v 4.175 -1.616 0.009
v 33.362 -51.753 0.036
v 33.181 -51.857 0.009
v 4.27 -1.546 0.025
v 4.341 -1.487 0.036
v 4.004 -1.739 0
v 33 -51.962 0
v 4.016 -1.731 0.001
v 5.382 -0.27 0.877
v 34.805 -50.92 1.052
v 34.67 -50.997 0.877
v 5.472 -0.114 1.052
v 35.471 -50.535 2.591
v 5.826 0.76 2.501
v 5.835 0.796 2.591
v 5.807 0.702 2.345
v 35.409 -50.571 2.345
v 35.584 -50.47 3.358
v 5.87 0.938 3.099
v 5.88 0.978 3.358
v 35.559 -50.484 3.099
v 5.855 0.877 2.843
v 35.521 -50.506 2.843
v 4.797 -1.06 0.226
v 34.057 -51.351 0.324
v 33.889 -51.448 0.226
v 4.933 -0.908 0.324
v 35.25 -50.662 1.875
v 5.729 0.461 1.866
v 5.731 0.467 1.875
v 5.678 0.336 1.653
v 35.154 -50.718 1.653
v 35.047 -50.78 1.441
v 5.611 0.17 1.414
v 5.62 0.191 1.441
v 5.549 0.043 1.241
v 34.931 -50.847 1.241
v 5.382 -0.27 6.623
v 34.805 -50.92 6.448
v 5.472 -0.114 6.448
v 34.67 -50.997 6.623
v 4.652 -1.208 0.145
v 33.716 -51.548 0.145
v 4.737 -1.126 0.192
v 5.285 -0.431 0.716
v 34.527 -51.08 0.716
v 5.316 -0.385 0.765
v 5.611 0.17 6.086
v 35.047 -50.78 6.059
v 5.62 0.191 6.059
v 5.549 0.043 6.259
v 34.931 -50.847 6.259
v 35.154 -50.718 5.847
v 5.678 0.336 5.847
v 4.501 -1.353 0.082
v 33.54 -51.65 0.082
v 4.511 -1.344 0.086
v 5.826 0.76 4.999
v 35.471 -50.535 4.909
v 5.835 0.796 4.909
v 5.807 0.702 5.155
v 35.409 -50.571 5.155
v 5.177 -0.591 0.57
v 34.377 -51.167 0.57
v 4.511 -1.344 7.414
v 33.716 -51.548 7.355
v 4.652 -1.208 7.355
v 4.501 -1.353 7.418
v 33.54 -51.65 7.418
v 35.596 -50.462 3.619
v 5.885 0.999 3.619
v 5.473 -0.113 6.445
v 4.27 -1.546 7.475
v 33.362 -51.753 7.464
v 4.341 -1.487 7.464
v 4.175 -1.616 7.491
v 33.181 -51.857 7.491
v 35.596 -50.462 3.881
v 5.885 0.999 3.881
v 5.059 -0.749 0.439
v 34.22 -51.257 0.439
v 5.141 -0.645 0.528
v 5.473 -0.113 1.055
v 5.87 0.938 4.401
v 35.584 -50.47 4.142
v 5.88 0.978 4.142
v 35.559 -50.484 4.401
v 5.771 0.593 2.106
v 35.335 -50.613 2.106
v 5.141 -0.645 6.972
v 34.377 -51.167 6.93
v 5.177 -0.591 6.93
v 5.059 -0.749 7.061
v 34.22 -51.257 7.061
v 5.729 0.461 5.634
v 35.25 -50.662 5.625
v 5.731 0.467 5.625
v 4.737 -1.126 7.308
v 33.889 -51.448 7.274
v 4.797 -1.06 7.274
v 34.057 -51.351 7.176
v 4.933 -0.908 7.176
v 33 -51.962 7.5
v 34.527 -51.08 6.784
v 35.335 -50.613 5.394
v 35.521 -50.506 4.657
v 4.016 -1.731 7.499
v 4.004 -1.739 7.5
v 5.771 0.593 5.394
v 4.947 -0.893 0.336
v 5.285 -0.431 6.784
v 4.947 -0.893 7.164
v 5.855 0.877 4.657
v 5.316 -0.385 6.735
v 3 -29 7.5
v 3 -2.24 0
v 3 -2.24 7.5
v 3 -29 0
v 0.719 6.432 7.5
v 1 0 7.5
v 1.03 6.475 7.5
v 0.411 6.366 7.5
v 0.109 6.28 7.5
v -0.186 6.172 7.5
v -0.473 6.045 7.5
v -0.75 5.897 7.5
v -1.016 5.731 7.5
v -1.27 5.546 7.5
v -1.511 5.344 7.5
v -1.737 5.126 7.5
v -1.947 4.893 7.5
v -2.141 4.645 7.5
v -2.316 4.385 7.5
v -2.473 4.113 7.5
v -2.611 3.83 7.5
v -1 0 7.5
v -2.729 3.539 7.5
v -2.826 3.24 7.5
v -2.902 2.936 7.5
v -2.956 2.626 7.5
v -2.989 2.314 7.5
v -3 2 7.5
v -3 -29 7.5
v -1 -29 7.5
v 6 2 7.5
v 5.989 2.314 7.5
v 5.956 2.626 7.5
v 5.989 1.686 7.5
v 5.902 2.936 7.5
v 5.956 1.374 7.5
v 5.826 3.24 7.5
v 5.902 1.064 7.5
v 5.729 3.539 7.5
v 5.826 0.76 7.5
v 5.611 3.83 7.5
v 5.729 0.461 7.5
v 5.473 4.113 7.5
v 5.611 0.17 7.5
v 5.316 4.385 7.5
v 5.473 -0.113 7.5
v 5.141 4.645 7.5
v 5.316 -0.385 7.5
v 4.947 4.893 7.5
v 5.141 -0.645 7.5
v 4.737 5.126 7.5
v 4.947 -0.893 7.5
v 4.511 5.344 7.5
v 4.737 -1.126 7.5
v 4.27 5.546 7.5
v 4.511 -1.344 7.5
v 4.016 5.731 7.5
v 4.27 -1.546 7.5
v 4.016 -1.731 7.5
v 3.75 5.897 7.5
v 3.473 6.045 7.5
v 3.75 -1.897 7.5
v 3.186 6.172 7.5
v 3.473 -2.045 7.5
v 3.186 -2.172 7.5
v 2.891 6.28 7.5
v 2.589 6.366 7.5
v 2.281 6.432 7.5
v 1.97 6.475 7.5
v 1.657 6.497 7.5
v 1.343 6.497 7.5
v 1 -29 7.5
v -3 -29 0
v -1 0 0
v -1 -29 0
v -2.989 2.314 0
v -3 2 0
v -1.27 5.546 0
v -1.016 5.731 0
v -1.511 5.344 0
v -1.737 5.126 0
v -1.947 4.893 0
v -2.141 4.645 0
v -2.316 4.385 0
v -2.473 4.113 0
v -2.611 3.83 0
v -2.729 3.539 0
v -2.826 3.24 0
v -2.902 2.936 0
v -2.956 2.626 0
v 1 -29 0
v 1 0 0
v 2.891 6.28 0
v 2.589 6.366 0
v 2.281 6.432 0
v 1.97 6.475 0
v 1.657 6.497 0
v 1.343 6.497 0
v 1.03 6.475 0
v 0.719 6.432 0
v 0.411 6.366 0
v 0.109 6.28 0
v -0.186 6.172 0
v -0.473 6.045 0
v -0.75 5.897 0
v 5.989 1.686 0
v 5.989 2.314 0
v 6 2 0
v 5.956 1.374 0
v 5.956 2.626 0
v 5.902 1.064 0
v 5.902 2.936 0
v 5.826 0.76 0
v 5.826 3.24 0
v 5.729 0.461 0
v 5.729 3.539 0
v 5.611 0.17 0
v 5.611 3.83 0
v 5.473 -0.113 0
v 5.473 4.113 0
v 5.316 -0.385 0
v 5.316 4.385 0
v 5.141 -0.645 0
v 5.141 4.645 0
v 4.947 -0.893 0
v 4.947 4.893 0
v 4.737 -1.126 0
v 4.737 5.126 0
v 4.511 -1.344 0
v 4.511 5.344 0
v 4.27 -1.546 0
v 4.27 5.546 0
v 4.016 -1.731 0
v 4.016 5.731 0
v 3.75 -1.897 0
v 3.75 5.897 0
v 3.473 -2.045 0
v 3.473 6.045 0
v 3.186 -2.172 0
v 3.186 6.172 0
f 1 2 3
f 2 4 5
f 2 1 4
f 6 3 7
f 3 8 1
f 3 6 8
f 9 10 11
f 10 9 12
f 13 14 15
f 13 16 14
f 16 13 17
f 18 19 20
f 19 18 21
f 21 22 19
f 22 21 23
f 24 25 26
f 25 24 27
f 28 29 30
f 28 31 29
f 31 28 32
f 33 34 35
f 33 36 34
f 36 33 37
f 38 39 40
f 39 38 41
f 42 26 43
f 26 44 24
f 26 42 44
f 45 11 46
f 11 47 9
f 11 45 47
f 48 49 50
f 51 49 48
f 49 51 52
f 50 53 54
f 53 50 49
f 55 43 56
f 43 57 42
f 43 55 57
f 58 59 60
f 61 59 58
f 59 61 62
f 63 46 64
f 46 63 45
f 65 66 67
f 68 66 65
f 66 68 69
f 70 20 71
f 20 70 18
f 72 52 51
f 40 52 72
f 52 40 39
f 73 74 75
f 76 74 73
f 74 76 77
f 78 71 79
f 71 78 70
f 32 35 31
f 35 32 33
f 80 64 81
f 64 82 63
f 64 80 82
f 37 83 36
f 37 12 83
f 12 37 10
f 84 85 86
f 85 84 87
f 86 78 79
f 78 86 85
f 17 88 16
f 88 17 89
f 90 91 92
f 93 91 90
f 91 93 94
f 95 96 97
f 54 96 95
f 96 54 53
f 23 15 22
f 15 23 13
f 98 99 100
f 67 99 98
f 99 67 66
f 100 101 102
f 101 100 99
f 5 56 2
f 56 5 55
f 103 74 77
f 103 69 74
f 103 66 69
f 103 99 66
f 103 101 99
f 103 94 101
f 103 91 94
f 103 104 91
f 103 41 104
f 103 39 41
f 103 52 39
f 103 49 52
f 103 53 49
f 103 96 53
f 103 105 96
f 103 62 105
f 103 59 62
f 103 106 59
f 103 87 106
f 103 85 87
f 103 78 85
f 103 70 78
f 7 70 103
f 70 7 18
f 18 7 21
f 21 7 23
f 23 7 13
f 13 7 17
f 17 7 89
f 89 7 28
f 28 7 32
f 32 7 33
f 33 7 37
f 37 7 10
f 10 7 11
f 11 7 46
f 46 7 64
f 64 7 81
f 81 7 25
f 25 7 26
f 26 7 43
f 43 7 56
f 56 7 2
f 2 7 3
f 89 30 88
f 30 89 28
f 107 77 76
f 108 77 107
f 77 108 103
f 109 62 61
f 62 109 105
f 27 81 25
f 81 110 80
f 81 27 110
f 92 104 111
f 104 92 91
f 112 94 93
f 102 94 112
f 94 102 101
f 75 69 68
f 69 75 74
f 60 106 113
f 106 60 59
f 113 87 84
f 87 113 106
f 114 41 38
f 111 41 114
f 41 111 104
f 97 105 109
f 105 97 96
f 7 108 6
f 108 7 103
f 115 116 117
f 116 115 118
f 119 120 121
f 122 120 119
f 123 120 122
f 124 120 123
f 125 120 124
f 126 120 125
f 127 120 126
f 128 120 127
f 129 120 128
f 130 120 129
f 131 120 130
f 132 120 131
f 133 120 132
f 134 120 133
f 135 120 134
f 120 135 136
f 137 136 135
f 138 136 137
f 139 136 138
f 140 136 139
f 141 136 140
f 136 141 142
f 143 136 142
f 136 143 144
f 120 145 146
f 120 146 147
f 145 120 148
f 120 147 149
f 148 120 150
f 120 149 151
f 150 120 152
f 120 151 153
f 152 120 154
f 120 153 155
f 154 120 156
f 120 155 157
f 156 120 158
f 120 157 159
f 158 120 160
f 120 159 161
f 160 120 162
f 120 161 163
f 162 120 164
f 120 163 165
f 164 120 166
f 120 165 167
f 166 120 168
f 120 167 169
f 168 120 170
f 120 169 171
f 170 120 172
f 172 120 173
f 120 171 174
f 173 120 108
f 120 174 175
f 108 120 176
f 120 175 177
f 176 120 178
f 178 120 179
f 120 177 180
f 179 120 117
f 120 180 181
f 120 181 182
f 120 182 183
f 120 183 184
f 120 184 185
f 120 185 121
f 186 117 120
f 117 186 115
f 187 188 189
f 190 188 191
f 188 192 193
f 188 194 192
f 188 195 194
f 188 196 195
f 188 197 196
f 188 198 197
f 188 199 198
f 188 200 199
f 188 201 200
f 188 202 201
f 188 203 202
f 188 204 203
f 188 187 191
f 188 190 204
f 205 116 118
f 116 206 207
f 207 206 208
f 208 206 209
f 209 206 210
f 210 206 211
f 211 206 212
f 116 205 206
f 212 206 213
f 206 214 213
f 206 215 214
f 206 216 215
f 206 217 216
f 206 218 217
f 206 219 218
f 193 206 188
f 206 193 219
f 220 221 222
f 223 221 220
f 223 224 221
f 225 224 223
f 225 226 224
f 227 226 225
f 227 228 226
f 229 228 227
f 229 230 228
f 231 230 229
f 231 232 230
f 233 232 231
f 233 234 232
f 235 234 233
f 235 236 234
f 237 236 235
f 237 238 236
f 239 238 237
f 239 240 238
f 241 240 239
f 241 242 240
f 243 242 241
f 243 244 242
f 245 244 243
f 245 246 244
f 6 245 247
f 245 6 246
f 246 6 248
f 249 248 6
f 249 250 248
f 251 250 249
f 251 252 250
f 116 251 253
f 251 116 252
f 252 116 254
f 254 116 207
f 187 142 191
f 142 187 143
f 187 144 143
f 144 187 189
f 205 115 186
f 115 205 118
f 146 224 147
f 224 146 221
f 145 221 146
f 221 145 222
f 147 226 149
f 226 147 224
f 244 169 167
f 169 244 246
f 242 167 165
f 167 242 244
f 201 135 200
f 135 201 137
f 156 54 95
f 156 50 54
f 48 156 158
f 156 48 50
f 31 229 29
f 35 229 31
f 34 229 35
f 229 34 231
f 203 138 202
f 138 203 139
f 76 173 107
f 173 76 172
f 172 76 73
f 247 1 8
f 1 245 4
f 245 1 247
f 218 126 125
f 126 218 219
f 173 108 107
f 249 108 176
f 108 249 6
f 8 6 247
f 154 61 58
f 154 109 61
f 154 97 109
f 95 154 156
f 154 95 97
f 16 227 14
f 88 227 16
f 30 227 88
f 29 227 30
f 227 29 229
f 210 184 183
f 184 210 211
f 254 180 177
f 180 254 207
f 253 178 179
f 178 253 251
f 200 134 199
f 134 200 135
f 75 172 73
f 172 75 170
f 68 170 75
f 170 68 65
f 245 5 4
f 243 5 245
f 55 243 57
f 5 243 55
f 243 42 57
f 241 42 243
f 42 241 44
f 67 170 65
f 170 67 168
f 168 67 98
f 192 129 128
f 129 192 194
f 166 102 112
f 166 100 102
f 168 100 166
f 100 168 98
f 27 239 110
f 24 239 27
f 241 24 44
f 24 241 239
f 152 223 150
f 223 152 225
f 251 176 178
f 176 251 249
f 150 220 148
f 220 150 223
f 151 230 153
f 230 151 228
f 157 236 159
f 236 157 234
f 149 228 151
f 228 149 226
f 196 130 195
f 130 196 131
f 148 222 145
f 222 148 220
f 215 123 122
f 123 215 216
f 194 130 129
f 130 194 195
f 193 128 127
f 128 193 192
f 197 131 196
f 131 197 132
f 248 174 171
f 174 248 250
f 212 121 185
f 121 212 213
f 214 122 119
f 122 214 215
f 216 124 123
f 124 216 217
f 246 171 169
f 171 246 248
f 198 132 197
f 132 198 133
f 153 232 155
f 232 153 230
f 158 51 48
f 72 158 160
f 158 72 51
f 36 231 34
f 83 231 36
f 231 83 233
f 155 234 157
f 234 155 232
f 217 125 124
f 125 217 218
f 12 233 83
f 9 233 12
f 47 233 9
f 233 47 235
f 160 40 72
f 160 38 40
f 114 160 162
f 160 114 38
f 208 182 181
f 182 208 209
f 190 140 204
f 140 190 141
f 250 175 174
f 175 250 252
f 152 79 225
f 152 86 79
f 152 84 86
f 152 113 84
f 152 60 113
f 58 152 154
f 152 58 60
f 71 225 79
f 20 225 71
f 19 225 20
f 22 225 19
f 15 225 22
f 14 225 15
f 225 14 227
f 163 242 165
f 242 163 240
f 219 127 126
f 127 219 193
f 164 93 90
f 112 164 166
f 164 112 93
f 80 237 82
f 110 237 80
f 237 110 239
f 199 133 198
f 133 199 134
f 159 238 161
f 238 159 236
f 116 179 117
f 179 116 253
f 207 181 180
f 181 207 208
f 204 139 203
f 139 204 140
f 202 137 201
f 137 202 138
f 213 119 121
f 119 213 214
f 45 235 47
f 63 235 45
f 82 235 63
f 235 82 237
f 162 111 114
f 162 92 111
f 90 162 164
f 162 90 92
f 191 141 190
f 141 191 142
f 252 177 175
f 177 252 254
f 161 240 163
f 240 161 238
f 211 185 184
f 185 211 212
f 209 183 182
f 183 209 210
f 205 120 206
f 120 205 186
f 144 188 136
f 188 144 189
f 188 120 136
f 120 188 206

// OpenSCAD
//!OpenSCAD
// title      : JacksonVive Headphone Arm
// author     : Stuart P. Bentley (@stuartpb)
// version    : 0.1.0
// file       : JacksonVive-headphone-arm.scad

/* [Configuration] */

part = "left"; // [left:Left Arm,right:Right Arm,both:Both Arms]

/* [Parameters] */

// The angle of the arm from the headgear, in degrees.
arm_angle = 30;

clip_thickness = 2;

/* [Measurements] */
// The length of the slot
headstrap_width = 29;

headstrap_thickness = 2;

// The width of the headphone arm.
arm_width = 7.5;

arm_thickness = 3;

arm_length = 60;

endstop_length = 8;

// The width of the base of the endstop wedge.
endstop_jut = 1;

// The width of the gap behind the endstop wedge.
endstop_carveout = 1;

endstop_carveout_length = 5;

detente_width = 1.5;

detente_spacing = 2;

detente_depth = 0.5;

/* [Tweaks] */

$fn = 90;

/* [Hidden] */

clip_width = clip_thickness*2 + headstrap_thickness;
top_width = clip_width + arm_thickness;

module headphone_arm(flip) {
  mirror([flip, 0, 0]) difference() {
    union () {
      translate([-clip_width/2,-headstrap_width,0])
        cube([clip_width, headstrap_width + clip_thickness, arm_width]);
      translate([arm_thickness/2,clip_thickness,0]) cylinder(d=top_width, h=arm_width);
      translate([arm_thickness,0,arm_width/2]) rotate([90-arm_angle,90,0]) intersection () {
        scale([1, 2*arm_thickness/arm_width, 1]) cylinder(d=arm_width, h=arm_length);
        translate([-arm_width/2,0,0]) cube([arm_width, arm_thickness, arm_length]);
      }
    }
    // clip cutout
    translate([-headstrap_thickness/2,-headstrap_width, 0])
      cube([headstrap_thickness, headstrap_width, arm_width]);
  }
}

if (part == "both") {
  translate([ 30, 0]) headphone_arm(0);
  translate([-30, 0]) headphone_arm(1);
}
else if (part == "left") headphone_arm(0);
else if (part == "right") headphone_arm(1);
